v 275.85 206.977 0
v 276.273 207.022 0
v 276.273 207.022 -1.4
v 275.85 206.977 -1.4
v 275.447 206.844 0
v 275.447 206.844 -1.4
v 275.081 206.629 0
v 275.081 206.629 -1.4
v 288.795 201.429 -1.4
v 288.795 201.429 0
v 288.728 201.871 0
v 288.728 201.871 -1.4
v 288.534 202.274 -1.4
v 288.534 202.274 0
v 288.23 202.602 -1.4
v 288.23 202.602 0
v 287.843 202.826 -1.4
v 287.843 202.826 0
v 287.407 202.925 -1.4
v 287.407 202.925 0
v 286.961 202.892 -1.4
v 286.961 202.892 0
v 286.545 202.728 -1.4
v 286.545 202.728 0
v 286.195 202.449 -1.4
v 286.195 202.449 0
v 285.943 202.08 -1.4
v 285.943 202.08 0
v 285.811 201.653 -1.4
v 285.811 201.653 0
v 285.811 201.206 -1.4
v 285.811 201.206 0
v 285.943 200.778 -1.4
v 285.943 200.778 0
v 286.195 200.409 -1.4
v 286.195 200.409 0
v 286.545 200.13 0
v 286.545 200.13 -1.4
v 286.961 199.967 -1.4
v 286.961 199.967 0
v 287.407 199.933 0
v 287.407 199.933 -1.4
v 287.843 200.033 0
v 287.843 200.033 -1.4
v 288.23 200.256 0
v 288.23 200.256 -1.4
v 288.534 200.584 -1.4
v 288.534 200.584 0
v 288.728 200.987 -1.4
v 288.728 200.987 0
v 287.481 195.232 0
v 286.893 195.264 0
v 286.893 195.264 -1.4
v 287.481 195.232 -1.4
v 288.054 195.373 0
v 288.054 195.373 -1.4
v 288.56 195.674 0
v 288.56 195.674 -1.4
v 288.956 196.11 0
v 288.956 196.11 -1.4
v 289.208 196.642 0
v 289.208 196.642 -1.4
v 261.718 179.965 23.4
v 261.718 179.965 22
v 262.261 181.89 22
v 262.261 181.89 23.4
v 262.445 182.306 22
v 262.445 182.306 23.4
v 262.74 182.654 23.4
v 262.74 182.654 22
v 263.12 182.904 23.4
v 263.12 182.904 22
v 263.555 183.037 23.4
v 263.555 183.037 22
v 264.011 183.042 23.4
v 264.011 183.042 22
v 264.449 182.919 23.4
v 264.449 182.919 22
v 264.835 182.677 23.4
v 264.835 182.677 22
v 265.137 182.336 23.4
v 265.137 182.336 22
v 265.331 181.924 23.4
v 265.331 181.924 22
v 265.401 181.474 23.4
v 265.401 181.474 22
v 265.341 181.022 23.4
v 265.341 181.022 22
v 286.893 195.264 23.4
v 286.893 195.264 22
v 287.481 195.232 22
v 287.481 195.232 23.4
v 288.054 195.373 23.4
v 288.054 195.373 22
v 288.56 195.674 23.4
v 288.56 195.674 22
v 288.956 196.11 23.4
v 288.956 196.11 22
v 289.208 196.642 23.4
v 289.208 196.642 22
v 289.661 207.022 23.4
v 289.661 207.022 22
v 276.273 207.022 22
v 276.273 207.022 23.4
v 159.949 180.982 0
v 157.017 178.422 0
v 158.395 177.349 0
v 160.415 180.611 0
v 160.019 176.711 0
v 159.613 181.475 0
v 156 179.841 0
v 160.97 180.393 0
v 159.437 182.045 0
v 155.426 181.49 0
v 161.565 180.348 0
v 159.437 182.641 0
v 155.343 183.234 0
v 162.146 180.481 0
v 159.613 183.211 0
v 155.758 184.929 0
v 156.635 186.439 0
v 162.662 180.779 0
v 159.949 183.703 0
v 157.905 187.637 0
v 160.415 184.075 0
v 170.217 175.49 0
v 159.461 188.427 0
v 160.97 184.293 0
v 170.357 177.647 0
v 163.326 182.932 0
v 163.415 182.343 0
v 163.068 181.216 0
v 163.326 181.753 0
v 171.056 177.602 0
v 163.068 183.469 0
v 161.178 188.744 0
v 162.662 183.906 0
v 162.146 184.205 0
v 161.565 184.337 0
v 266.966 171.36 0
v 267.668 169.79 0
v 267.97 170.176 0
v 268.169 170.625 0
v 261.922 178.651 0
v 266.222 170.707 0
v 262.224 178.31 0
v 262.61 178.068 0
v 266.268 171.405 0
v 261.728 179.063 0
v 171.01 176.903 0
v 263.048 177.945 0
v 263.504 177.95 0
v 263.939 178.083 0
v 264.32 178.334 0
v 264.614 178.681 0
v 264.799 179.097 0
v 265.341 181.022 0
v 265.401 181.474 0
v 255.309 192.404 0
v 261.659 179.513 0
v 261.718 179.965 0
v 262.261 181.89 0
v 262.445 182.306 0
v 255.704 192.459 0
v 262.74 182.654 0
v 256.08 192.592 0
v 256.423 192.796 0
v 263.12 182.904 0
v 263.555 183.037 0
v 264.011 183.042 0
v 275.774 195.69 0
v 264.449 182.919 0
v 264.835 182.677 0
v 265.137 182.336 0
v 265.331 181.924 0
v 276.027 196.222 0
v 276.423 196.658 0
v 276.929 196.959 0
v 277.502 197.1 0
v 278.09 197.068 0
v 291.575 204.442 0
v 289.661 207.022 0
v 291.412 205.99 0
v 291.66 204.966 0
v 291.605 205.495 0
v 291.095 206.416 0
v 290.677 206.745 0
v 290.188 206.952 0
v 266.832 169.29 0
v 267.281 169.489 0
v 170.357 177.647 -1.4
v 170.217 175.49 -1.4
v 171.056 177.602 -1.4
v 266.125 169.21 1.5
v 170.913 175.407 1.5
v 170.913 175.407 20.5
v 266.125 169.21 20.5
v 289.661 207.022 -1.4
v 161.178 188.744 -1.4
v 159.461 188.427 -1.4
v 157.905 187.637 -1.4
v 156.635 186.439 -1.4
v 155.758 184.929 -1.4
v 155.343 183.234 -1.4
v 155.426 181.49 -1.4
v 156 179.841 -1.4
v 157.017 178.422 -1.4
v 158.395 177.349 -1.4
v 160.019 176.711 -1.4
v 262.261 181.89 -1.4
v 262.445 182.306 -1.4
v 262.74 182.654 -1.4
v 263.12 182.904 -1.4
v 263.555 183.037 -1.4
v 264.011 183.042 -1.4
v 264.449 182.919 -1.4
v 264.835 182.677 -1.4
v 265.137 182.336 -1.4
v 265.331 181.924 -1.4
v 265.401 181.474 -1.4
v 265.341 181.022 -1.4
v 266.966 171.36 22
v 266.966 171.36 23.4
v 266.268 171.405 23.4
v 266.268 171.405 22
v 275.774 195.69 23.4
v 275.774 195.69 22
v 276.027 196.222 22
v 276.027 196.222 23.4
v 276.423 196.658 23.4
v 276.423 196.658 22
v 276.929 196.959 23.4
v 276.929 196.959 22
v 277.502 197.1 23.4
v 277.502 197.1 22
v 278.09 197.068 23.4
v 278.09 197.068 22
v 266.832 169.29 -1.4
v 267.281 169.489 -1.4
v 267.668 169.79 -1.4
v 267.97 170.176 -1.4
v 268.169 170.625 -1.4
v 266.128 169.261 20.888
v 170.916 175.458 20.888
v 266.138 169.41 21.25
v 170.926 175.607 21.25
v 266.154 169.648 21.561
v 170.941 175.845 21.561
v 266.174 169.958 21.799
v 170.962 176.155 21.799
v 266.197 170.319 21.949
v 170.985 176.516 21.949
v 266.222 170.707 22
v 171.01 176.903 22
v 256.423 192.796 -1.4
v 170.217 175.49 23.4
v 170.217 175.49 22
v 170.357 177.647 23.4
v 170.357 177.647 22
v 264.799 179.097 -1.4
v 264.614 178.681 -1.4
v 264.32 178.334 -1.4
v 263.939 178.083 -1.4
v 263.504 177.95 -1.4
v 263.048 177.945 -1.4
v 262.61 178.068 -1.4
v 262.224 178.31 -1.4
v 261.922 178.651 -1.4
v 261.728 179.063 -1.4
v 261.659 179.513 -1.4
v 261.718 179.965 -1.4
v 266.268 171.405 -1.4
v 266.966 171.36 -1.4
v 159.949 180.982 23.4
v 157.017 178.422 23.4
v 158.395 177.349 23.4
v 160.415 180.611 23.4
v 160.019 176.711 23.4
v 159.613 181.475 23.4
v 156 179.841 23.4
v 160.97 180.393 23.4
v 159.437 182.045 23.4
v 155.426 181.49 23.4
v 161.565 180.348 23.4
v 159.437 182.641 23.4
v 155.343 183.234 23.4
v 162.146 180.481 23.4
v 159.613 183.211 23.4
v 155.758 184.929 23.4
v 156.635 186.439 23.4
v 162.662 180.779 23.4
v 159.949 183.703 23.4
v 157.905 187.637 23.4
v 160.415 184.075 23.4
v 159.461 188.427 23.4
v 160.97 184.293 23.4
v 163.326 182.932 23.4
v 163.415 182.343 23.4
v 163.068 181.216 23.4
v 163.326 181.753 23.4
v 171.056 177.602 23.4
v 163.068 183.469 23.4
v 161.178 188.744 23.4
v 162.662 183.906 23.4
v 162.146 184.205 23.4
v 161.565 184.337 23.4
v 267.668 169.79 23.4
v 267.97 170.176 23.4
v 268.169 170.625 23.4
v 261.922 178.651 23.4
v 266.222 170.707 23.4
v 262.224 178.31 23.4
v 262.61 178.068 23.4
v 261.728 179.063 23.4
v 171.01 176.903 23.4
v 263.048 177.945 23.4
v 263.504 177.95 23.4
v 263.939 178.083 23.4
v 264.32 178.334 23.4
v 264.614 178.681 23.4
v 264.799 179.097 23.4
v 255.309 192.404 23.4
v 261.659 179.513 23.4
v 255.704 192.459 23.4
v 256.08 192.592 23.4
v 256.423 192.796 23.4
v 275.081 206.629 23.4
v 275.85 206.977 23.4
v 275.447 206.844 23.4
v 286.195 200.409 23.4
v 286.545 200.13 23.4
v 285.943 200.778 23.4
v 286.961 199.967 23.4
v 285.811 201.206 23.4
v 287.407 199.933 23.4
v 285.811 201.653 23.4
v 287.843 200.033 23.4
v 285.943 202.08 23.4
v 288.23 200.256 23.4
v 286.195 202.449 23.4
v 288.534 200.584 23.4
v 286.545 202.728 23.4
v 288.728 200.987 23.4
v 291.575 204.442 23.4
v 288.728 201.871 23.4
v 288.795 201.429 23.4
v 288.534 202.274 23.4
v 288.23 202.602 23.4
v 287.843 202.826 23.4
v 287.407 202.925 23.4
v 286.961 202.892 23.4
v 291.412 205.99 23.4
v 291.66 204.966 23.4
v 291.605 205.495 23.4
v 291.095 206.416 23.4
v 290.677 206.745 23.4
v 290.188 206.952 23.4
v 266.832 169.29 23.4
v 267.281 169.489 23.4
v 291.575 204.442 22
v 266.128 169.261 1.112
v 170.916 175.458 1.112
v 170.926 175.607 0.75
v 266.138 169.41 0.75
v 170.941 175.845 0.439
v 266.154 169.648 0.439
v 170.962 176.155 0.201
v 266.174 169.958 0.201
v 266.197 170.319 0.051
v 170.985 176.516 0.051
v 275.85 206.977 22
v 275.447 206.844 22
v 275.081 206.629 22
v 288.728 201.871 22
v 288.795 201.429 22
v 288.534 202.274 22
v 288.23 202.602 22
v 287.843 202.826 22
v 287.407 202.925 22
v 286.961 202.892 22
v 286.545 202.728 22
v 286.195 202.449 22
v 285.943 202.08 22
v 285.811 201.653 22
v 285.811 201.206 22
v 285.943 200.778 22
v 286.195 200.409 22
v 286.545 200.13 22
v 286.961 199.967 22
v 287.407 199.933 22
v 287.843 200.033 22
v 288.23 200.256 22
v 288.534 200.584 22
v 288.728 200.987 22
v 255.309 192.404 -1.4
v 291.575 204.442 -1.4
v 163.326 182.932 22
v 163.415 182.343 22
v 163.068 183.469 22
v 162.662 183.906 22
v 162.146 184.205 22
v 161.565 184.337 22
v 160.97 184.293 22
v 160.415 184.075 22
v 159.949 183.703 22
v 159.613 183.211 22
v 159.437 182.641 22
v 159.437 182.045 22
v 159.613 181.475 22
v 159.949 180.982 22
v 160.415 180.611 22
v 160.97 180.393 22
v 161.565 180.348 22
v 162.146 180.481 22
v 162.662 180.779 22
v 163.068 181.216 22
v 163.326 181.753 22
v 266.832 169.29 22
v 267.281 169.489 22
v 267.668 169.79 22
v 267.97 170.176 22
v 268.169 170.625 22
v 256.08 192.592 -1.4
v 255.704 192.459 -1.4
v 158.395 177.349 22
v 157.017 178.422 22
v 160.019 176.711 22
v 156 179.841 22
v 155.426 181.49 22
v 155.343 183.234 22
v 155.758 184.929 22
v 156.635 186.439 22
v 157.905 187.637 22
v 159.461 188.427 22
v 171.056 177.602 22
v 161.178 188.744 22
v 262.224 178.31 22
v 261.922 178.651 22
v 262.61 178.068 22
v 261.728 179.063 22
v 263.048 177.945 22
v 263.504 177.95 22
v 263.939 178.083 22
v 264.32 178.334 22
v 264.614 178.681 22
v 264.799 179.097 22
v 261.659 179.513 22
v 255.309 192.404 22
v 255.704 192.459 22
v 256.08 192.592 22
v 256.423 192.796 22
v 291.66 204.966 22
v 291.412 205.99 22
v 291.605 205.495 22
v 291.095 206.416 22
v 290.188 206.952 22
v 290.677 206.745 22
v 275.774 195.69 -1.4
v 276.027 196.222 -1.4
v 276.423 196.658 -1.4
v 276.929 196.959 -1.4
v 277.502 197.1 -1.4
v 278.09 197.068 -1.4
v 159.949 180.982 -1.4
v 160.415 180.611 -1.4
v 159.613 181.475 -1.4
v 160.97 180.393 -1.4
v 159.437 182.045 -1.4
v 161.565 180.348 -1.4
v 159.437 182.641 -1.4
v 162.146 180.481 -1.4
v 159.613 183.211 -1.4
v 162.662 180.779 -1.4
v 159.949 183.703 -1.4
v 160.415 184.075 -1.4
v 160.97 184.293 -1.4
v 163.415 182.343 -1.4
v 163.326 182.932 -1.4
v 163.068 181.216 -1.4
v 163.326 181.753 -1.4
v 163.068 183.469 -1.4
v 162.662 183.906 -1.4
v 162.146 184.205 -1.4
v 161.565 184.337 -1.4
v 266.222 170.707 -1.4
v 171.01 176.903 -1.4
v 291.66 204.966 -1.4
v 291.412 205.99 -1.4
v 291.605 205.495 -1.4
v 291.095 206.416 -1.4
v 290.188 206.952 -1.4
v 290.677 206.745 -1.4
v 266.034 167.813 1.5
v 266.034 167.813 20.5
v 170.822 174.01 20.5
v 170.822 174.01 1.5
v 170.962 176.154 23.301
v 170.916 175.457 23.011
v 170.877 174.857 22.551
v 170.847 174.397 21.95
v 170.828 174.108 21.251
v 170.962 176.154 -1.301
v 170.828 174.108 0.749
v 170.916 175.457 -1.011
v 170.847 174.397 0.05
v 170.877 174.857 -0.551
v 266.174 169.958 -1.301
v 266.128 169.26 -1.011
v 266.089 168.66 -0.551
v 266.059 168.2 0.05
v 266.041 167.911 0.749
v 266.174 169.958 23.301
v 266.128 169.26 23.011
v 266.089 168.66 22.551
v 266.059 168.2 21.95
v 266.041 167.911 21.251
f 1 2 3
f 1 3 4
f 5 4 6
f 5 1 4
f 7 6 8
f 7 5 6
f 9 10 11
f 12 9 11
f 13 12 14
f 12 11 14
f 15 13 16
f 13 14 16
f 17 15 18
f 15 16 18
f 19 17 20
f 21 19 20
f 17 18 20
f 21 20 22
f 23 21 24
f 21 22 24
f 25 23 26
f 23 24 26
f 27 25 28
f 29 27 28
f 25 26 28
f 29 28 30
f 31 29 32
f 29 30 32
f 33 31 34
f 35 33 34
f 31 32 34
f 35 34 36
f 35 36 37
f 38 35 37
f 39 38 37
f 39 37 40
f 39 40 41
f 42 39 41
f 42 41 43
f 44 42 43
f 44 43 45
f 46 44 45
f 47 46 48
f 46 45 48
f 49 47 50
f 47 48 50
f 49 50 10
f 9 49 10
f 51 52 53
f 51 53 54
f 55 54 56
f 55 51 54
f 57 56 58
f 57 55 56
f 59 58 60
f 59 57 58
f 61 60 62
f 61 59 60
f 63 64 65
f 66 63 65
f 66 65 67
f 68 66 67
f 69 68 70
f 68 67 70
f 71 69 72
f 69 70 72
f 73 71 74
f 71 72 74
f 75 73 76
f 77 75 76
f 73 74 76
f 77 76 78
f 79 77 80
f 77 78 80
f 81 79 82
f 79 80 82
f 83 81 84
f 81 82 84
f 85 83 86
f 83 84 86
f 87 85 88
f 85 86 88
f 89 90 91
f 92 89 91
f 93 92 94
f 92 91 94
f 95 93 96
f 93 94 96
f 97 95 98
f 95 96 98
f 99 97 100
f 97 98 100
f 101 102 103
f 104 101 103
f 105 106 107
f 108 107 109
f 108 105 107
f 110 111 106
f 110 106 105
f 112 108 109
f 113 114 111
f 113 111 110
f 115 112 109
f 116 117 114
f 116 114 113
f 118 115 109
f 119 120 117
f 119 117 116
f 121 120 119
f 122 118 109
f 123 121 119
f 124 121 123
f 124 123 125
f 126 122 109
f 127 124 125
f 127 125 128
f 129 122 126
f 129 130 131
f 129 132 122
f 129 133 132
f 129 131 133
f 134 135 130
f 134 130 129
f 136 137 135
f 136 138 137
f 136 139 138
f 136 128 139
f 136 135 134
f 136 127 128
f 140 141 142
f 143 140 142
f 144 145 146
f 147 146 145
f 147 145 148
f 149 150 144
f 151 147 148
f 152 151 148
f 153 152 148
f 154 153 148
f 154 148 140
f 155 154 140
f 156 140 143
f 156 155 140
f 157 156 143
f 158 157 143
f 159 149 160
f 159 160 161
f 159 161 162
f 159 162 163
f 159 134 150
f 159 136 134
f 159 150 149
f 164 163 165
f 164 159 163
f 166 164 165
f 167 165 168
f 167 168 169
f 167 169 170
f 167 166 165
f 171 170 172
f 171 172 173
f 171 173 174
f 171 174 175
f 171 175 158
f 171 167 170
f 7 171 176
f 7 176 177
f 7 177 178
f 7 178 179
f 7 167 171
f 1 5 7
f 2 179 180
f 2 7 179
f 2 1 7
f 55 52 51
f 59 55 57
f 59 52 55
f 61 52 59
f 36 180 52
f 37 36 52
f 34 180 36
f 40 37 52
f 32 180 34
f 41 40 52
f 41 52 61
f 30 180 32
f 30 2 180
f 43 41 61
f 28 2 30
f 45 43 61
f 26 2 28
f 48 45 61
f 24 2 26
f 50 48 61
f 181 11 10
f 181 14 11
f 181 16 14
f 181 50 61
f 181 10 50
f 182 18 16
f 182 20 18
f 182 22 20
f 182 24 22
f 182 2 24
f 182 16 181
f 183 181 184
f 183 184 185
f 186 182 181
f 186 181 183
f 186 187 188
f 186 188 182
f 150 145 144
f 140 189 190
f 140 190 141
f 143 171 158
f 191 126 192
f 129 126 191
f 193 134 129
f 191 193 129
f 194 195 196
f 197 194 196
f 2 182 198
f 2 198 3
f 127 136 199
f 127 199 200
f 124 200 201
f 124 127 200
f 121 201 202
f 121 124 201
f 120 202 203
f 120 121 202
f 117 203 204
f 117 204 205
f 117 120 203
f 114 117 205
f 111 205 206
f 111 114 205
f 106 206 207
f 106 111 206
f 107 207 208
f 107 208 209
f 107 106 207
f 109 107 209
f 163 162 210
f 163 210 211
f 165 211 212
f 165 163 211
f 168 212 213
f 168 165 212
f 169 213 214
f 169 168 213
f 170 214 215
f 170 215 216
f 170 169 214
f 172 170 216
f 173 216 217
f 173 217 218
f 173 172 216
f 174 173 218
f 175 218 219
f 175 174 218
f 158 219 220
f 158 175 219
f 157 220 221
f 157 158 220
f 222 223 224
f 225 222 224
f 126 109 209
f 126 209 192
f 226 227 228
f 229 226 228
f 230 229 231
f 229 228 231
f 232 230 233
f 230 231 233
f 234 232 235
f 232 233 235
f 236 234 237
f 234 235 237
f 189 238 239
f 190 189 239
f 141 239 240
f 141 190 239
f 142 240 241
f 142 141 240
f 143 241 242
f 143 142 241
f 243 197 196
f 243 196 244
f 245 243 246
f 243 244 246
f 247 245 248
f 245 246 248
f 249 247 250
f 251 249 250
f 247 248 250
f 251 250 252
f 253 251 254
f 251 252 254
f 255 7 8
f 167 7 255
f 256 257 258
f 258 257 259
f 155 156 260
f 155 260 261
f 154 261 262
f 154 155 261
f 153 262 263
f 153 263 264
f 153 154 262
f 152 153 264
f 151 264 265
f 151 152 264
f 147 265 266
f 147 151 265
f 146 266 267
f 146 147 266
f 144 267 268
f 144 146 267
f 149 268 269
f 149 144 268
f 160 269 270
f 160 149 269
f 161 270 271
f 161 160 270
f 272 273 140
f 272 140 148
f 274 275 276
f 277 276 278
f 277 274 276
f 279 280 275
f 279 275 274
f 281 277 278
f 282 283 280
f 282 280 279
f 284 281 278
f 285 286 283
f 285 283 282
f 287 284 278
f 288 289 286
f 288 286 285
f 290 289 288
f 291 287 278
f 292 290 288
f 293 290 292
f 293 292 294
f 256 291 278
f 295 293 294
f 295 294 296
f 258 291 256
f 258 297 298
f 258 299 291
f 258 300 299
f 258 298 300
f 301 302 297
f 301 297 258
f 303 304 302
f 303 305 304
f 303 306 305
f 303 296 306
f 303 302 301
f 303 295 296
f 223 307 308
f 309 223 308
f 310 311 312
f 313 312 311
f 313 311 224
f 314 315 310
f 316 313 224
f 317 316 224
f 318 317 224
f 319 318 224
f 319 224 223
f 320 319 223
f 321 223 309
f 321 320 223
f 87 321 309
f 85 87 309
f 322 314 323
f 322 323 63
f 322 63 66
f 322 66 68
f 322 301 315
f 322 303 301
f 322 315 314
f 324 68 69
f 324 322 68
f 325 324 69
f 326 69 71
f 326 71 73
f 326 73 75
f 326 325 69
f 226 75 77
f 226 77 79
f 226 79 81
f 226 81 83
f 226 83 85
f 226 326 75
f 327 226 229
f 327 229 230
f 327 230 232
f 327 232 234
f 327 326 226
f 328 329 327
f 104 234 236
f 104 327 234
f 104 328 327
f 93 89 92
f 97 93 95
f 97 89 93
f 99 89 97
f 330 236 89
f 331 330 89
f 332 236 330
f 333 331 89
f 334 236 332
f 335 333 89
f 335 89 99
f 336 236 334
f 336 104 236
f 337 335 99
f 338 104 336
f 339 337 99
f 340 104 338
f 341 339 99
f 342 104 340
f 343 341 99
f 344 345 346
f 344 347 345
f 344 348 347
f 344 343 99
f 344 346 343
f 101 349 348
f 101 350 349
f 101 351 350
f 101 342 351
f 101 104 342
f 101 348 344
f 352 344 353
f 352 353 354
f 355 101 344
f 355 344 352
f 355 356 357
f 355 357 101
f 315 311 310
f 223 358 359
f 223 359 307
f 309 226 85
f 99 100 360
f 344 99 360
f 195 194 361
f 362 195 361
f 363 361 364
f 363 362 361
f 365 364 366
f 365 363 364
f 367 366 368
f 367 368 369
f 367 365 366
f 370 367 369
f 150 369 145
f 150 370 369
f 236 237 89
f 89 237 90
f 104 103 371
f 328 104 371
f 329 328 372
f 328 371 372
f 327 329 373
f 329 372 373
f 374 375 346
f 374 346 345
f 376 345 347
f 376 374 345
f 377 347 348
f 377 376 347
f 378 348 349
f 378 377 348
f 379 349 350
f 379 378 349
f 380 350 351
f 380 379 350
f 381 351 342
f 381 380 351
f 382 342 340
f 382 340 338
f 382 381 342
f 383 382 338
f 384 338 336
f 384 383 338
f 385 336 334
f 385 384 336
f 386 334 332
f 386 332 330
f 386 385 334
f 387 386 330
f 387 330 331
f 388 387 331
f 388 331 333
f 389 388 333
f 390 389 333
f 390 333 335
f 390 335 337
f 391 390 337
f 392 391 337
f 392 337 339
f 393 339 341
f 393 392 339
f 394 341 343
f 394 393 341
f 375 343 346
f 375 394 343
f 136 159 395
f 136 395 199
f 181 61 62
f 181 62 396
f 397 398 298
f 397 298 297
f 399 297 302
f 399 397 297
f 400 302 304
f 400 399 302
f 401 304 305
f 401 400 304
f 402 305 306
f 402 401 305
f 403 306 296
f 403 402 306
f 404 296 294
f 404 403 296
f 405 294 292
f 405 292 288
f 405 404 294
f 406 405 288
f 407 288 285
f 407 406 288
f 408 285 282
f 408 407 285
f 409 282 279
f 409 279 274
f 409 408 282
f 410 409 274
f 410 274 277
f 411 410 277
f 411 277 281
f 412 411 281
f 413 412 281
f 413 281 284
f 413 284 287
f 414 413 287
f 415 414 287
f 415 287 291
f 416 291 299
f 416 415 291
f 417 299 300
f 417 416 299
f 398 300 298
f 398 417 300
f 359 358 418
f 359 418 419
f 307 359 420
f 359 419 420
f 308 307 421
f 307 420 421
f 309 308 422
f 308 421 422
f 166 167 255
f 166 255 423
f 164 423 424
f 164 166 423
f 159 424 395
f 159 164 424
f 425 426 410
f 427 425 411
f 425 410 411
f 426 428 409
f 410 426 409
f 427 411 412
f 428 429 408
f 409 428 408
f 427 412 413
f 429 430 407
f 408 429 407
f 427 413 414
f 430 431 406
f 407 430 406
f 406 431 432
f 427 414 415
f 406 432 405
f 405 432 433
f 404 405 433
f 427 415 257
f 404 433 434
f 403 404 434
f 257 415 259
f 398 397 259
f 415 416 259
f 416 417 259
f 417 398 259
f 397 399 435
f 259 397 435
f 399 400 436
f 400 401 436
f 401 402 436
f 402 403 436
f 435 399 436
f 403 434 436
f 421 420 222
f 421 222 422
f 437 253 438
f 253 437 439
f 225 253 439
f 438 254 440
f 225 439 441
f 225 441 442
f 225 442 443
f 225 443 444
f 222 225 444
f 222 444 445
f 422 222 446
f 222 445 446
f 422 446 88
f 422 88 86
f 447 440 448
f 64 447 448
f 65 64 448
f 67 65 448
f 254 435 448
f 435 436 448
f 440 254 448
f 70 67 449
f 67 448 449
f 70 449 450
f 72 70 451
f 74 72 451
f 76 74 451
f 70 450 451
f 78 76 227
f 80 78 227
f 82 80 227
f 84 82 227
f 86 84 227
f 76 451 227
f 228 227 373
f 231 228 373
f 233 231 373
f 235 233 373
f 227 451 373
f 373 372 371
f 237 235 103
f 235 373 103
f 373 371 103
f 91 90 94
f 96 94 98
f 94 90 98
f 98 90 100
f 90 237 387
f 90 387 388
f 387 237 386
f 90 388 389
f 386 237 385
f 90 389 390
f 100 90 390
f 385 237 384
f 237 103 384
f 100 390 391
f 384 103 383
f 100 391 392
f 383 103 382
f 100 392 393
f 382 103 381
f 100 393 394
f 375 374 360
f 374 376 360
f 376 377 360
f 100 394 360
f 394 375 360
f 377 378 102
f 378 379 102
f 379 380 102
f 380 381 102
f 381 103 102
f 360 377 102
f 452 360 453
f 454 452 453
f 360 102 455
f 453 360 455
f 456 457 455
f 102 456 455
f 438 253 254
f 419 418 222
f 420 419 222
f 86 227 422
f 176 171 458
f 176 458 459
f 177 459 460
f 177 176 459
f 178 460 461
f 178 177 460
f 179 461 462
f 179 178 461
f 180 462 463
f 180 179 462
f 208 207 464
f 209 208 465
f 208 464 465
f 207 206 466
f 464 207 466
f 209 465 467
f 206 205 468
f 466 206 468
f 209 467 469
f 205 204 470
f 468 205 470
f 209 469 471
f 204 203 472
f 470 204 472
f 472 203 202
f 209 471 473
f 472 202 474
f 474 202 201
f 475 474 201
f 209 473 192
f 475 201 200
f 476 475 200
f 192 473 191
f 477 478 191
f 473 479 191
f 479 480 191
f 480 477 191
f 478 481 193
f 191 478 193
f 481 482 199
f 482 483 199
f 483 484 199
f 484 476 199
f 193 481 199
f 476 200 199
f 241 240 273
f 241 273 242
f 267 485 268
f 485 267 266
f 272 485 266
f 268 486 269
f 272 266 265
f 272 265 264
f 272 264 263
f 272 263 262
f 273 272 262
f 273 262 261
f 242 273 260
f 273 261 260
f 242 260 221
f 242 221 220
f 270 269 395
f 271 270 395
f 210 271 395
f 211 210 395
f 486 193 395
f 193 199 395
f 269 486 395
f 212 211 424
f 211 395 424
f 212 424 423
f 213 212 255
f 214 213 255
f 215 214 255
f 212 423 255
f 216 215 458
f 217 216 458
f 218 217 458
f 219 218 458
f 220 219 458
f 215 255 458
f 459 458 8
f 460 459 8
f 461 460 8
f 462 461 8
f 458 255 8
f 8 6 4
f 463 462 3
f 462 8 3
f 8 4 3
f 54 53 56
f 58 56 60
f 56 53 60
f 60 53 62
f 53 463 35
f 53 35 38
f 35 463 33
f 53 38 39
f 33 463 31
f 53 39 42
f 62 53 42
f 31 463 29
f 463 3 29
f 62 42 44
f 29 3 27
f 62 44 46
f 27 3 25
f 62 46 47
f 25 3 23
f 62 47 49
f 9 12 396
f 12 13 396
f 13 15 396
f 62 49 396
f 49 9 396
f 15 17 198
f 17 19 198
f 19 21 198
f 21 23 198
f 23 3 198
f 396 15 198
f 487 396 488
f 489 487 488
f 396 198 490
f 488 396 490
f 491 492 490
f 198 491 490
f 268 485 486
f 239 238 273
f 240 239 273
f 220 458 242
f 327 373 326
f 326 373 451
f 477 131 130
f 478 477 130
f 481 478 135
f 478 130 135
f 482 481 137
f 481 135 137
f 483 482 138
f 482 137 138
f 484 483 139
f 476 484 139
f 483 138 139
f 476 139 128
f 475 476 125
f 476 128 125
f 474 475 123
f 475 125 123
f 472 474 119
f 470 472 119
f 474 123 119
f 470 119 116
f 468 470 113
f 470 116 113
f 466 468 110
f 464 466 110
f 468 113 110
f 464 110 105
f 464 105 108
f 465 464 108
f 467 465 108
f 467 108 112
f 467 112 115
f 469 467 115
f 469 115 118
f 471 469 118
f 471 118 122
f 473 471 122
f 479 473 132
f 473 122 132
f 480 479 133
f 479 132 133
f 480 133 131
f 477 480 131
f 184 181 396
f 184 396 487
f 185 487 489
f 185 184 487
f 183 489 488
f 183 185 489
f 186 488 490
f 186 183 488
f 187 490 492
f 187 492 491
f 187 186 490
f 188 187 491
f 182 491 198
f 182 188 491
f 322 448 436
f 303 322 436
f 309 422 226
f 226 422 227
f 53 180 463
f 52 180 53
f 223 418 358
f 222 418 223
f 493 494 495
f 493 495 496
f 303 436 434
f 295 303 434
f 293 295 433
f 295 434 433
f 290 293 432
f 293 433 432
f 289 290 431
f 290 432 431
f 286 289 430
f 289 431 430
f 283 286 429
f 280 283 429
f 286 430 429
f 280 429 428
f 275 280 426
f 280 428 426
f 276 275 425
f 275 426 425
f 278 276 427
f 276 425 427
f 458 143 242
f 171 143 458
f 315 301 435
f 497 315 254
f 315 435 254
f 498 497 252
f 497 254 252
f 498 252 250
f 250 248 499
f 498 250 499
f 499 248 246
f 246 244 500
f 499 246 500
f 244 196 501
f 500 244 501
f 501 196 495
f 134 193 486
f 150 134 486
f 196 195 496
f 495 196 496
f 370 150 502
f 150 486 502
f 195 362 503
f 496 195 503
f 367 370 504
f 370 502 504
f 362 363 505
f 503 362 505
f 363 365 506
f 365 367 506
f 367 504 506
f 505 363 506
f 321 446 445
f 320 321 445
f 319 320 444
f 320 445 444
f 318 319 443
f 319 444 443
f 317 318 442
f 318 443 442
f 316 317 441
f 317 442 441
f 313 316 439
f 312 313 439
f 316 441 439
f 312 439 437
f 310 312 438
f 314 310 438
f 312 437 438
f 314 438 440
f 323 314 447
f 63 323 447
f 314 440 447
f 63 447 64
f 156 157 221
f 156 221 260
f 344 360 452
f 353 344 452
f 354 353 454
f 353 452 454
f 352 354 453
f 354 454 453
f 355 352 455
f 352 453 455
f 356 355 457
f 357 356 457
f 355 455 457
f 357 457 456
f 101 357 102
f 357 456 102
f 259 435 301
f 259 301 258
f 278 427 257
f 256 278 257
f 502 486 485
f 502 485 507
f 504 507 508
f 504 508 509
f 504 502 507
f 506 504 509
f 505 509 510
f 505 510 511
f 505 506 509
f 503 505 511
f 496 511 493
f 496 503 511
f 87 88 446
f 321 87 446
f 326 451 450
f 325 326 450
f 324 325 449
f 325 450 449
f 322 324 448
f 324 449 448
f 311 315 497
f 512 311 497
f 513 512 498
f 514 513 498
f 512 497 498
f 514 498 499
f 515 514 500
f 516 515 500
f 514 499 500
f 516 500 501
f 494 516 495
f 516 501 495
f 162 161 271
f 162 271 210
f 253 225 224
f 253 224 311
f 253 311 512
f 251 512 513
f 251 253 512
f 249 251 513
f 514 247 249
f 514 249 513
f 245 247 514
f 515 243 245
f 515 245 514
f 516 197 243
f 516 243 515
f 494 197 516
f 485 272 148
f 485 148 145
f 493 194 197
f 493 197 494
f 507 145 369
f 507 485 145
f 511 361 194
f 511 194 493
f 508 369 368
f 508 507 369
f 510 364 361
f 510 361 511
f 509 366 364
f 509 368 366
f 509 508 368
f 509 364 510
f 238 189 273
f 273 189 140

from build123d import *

# Parameters (mm, degrees)
SKETCH1_R                     = 1.5
SKETCH1_R_2                   = 2
BASE_FLANGE1_DEPTH            = 1.4
EDGE_FLANGE1_STRIP_W          = 8.6
EDGE_FLANGE1_STRIP_H          = 1.4
EDGE_FLANGE1_STRIP_CUT_DEPTH  = 95.413569059
EDGE_FLANGE1_RELIEF_W         = 9.3
EDGE_FLANGE1_RELIEF_H         = 0.7
EDGE_FLANGE1_RELIEF_CUT_DEPTH = 1.4
EDGE_FLANGE1_DEPTH            = 95.413569059


# Sheet-metal steps are written as plain solids
with BuildPart() as part:
    # Sketch1 → Base-Flange1 (new body)
    with BuildSketch(Plane.XY):
        with BuildLine():
            Line((170.912926542, 175.40661908), (266.125044601, 169.209705713))
            ThreePointArc((266.125044601, 169.209705713), (267.39344589, 169.561157821), (268.168771741, 170.624750901))
            Line((268.168771741, 170.624750901), (275.774482778, 195.689745971))
            ThreePointArc((275.774482778, 195.689745971), (276.665177338, 196.827499007), (278.089902914, 197.068280651))
            Line((278.089902914, 197.068280651), (286.893064256, 195.263905966))
            ThreePointArc((286.893064256, 195.263905966), (288.317789833, 195.50468761), (289.208484393, 196.642440646))
            Line((289.208484393, 196.642440646), (291.575051406, 204.441578719))
            ThreePointArc((291.575051406, 204.441578719), (291.26768584, 206.213641138), (289.661220117, 207.02231084))
            Line((289.661220117, 207.02231084), (276.272582238, 207.02231084))
            ThreePointArc((276.272582238, 207.02231084), (275.645401821, 206.921427667), (275.081493354, 206.628955565))
            Line((275.081493354, 206.628955565), (256.422617181, 192.796164997))
            ThreePointArc((256.422617181, 192.796164997), (255.8954918, 192.516238104), (255.30923711, 192.404319956))
            Line((255.30923711, 192.404319956), (161.178140888, 188.744148243))
            ThreePointArc((161.178140888, 188.744148243), (155.343352432, 183.233583314), (160.019332793, 176.710831608))
            Line((160.019332793, 176.710831608), (170.912926542, 175.40661908))
        make_face()
        with Locations((287.294653103, 201.429207007)):
            Circle(SKETCH1_R, mode=Mode.SUBTRACT)
        with Locations((161.415148292, 182.342793615)):
            Circle(SKETCH1_R_2, mode=Mode.SUBTRACT)
        with BuildLine():
            Line((261.718420137, 179.964788264), (262.260552067, 181.889909811))
            ThreePointArc((262.260552067, 181.889909811), (264.234354849, 182.996301504), (265.340746542, 181.022498723))
            Line((265.340746542, 181.022498723), (264.798614613, 179.097377176))
            ThreePointArc((264.798614613, 179.097377176), (262.824811831, 177.990985482), (261.718420137, 179.964788264))
        make_face(mode=Mode.SUBTRACT)
    extrude(amount=-BASE_FLANGE1_DEPTH)

    # Edge-Flange1 strip (across the edge) → Edge-Flange1 strip cut (cut)
    with BuildSketch(Plane(origin=(170.912926542, 175.40661908, 0), x_dir=(0.06494792541912509, 0.9978886546021816, 3.4914813388431334e-15), z_dir=(0.9978886546021816, -0.06494792541912509, 0))):
        with Locations((-2.8, -0.7)):
            Rectangle(EDGE_FLANGE1_STRIP_W, EDGE_FLANGE1_STRIP_H)
    extrude(amount=EDGE_FLANGE1_STRIP_CUT_DEPTH, mode=Mode.SUBTRACT)

    # Edge-Flange1 relief (on the sheet) → Edge-Flange1 relief cut (cut)
    with BuildSketch(Plane(origin=(171.01034843, 176.903452062, 0), x_dir=(0.06494792541912509, 0.9978886546021816, 6.982962677686267e-15), z_dir=(0, 0, 1))):
        with Locations((-3.95, 0.35)):
            Rectangle(EDGE_FLANGE1_RELIEF_W, EDGE_FLANGE1_RELIEF_H)
        with Locations((-3.95, -95.763569059)):
            Rectangle(EDGE_FLANGE1_RELIEF_W, EDGE_FLANGE1_RELIEF_H)
    extrude(amount=-EDGE_FLANGE1_RELIEF_CUT_DEPTH, mode=Mode.SUBTRACT)

    # Edge-Flange1 section (across the edge) → Edge-Flange1 (add)
    with BuildSketch(Plane(origin=(170.912926542, 175.40661908, 0), x_dir=(0.06494792541912509, 0.9978886546021816, 3.4914813388431334e-15), z_dir=(0.9978886546021816, -0.06494792541912509, 0))):
        with BuildLine():
            Line((-1.4, 1.5), (-1.4, 11))
            Line((-1.4, 11), (0, 11))
            Line((0, 11), (0, 1.5))
            ThreePointArc((0, 1.5), (0.439339828, 0.439339828), (1.5, 0))
            Line((1.5, 0), (1.5, -1.4))
            ThreePointArc((1.5, -1.4), (-0.550609665, -0.550609665), (-1.4, 1.5))
        make_face()
    extrude(amount=EDGE_FLANGE1_DEPTH)

    # Mirror1: part across plane


with BuildPart() as part_1:
    add(part.part)
    add(part.part.mirror(Plane(origin=(170.821999446, 174.009574964, 11), x_dir=(1, 0, 0), z_dir=(0, 0, -1))))


solid = part_1.part
